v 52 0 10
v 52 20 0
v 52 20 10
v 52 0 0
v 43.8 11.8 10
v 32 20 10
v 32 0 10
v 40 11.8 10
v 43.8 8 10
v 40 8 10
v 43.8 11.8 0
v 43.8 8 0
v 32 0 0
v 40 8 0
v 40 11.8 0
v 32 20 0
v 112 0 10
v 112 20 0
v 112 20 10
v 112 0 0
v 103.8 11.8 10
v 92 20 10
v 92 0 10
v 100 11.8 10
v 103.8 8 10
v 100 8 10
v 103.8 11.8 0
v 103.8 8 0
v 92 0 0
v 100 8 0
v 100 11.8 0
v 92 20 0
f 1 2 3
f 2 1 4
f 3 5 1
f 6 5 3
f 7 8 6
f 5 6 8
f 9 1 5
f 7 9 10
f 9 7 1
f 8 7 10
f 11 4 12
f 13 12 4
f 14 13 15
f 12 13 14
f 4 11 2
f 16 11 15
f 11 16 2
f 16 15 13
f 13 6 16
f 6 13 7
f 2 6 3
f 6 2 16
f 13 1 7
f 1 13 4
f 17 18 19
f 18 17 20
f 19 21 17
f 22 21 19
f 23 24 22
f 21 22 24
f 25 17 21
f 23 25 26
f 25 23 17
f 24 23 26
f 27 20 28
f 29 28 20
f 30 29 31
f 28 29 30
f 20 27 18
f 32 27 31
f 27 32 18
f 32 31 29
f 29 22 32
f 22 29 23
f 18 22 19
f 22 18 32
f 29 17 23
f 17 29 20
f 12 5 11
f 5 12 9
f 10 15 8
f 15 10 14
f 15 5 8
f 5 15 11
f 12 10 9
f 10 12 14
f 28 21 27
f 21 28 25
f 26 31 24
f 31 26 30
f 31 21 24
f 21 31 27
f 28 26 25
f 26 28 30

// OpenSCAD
 difference(){
  union(){
	translate([32,0,0])cube([20,20,10]);
	translate([92,0,0])cube([20,20,10]);
}
	translate([40,8,-2]) cube([3.8,3.8,14]);
	translate([100,8,-2]) cube([3.8,3.8,14]);

}
 difference(){
  union(){
	translate([39,7,0]) cube([6,6,10]);
	translate([99,7,0]) cube([6,6,10]);
}
	translate([40,8,-2]) cube([3.8,3.8,14]);
	translate([100,8,-2]) cube([3.8,3.8,14]);
}
